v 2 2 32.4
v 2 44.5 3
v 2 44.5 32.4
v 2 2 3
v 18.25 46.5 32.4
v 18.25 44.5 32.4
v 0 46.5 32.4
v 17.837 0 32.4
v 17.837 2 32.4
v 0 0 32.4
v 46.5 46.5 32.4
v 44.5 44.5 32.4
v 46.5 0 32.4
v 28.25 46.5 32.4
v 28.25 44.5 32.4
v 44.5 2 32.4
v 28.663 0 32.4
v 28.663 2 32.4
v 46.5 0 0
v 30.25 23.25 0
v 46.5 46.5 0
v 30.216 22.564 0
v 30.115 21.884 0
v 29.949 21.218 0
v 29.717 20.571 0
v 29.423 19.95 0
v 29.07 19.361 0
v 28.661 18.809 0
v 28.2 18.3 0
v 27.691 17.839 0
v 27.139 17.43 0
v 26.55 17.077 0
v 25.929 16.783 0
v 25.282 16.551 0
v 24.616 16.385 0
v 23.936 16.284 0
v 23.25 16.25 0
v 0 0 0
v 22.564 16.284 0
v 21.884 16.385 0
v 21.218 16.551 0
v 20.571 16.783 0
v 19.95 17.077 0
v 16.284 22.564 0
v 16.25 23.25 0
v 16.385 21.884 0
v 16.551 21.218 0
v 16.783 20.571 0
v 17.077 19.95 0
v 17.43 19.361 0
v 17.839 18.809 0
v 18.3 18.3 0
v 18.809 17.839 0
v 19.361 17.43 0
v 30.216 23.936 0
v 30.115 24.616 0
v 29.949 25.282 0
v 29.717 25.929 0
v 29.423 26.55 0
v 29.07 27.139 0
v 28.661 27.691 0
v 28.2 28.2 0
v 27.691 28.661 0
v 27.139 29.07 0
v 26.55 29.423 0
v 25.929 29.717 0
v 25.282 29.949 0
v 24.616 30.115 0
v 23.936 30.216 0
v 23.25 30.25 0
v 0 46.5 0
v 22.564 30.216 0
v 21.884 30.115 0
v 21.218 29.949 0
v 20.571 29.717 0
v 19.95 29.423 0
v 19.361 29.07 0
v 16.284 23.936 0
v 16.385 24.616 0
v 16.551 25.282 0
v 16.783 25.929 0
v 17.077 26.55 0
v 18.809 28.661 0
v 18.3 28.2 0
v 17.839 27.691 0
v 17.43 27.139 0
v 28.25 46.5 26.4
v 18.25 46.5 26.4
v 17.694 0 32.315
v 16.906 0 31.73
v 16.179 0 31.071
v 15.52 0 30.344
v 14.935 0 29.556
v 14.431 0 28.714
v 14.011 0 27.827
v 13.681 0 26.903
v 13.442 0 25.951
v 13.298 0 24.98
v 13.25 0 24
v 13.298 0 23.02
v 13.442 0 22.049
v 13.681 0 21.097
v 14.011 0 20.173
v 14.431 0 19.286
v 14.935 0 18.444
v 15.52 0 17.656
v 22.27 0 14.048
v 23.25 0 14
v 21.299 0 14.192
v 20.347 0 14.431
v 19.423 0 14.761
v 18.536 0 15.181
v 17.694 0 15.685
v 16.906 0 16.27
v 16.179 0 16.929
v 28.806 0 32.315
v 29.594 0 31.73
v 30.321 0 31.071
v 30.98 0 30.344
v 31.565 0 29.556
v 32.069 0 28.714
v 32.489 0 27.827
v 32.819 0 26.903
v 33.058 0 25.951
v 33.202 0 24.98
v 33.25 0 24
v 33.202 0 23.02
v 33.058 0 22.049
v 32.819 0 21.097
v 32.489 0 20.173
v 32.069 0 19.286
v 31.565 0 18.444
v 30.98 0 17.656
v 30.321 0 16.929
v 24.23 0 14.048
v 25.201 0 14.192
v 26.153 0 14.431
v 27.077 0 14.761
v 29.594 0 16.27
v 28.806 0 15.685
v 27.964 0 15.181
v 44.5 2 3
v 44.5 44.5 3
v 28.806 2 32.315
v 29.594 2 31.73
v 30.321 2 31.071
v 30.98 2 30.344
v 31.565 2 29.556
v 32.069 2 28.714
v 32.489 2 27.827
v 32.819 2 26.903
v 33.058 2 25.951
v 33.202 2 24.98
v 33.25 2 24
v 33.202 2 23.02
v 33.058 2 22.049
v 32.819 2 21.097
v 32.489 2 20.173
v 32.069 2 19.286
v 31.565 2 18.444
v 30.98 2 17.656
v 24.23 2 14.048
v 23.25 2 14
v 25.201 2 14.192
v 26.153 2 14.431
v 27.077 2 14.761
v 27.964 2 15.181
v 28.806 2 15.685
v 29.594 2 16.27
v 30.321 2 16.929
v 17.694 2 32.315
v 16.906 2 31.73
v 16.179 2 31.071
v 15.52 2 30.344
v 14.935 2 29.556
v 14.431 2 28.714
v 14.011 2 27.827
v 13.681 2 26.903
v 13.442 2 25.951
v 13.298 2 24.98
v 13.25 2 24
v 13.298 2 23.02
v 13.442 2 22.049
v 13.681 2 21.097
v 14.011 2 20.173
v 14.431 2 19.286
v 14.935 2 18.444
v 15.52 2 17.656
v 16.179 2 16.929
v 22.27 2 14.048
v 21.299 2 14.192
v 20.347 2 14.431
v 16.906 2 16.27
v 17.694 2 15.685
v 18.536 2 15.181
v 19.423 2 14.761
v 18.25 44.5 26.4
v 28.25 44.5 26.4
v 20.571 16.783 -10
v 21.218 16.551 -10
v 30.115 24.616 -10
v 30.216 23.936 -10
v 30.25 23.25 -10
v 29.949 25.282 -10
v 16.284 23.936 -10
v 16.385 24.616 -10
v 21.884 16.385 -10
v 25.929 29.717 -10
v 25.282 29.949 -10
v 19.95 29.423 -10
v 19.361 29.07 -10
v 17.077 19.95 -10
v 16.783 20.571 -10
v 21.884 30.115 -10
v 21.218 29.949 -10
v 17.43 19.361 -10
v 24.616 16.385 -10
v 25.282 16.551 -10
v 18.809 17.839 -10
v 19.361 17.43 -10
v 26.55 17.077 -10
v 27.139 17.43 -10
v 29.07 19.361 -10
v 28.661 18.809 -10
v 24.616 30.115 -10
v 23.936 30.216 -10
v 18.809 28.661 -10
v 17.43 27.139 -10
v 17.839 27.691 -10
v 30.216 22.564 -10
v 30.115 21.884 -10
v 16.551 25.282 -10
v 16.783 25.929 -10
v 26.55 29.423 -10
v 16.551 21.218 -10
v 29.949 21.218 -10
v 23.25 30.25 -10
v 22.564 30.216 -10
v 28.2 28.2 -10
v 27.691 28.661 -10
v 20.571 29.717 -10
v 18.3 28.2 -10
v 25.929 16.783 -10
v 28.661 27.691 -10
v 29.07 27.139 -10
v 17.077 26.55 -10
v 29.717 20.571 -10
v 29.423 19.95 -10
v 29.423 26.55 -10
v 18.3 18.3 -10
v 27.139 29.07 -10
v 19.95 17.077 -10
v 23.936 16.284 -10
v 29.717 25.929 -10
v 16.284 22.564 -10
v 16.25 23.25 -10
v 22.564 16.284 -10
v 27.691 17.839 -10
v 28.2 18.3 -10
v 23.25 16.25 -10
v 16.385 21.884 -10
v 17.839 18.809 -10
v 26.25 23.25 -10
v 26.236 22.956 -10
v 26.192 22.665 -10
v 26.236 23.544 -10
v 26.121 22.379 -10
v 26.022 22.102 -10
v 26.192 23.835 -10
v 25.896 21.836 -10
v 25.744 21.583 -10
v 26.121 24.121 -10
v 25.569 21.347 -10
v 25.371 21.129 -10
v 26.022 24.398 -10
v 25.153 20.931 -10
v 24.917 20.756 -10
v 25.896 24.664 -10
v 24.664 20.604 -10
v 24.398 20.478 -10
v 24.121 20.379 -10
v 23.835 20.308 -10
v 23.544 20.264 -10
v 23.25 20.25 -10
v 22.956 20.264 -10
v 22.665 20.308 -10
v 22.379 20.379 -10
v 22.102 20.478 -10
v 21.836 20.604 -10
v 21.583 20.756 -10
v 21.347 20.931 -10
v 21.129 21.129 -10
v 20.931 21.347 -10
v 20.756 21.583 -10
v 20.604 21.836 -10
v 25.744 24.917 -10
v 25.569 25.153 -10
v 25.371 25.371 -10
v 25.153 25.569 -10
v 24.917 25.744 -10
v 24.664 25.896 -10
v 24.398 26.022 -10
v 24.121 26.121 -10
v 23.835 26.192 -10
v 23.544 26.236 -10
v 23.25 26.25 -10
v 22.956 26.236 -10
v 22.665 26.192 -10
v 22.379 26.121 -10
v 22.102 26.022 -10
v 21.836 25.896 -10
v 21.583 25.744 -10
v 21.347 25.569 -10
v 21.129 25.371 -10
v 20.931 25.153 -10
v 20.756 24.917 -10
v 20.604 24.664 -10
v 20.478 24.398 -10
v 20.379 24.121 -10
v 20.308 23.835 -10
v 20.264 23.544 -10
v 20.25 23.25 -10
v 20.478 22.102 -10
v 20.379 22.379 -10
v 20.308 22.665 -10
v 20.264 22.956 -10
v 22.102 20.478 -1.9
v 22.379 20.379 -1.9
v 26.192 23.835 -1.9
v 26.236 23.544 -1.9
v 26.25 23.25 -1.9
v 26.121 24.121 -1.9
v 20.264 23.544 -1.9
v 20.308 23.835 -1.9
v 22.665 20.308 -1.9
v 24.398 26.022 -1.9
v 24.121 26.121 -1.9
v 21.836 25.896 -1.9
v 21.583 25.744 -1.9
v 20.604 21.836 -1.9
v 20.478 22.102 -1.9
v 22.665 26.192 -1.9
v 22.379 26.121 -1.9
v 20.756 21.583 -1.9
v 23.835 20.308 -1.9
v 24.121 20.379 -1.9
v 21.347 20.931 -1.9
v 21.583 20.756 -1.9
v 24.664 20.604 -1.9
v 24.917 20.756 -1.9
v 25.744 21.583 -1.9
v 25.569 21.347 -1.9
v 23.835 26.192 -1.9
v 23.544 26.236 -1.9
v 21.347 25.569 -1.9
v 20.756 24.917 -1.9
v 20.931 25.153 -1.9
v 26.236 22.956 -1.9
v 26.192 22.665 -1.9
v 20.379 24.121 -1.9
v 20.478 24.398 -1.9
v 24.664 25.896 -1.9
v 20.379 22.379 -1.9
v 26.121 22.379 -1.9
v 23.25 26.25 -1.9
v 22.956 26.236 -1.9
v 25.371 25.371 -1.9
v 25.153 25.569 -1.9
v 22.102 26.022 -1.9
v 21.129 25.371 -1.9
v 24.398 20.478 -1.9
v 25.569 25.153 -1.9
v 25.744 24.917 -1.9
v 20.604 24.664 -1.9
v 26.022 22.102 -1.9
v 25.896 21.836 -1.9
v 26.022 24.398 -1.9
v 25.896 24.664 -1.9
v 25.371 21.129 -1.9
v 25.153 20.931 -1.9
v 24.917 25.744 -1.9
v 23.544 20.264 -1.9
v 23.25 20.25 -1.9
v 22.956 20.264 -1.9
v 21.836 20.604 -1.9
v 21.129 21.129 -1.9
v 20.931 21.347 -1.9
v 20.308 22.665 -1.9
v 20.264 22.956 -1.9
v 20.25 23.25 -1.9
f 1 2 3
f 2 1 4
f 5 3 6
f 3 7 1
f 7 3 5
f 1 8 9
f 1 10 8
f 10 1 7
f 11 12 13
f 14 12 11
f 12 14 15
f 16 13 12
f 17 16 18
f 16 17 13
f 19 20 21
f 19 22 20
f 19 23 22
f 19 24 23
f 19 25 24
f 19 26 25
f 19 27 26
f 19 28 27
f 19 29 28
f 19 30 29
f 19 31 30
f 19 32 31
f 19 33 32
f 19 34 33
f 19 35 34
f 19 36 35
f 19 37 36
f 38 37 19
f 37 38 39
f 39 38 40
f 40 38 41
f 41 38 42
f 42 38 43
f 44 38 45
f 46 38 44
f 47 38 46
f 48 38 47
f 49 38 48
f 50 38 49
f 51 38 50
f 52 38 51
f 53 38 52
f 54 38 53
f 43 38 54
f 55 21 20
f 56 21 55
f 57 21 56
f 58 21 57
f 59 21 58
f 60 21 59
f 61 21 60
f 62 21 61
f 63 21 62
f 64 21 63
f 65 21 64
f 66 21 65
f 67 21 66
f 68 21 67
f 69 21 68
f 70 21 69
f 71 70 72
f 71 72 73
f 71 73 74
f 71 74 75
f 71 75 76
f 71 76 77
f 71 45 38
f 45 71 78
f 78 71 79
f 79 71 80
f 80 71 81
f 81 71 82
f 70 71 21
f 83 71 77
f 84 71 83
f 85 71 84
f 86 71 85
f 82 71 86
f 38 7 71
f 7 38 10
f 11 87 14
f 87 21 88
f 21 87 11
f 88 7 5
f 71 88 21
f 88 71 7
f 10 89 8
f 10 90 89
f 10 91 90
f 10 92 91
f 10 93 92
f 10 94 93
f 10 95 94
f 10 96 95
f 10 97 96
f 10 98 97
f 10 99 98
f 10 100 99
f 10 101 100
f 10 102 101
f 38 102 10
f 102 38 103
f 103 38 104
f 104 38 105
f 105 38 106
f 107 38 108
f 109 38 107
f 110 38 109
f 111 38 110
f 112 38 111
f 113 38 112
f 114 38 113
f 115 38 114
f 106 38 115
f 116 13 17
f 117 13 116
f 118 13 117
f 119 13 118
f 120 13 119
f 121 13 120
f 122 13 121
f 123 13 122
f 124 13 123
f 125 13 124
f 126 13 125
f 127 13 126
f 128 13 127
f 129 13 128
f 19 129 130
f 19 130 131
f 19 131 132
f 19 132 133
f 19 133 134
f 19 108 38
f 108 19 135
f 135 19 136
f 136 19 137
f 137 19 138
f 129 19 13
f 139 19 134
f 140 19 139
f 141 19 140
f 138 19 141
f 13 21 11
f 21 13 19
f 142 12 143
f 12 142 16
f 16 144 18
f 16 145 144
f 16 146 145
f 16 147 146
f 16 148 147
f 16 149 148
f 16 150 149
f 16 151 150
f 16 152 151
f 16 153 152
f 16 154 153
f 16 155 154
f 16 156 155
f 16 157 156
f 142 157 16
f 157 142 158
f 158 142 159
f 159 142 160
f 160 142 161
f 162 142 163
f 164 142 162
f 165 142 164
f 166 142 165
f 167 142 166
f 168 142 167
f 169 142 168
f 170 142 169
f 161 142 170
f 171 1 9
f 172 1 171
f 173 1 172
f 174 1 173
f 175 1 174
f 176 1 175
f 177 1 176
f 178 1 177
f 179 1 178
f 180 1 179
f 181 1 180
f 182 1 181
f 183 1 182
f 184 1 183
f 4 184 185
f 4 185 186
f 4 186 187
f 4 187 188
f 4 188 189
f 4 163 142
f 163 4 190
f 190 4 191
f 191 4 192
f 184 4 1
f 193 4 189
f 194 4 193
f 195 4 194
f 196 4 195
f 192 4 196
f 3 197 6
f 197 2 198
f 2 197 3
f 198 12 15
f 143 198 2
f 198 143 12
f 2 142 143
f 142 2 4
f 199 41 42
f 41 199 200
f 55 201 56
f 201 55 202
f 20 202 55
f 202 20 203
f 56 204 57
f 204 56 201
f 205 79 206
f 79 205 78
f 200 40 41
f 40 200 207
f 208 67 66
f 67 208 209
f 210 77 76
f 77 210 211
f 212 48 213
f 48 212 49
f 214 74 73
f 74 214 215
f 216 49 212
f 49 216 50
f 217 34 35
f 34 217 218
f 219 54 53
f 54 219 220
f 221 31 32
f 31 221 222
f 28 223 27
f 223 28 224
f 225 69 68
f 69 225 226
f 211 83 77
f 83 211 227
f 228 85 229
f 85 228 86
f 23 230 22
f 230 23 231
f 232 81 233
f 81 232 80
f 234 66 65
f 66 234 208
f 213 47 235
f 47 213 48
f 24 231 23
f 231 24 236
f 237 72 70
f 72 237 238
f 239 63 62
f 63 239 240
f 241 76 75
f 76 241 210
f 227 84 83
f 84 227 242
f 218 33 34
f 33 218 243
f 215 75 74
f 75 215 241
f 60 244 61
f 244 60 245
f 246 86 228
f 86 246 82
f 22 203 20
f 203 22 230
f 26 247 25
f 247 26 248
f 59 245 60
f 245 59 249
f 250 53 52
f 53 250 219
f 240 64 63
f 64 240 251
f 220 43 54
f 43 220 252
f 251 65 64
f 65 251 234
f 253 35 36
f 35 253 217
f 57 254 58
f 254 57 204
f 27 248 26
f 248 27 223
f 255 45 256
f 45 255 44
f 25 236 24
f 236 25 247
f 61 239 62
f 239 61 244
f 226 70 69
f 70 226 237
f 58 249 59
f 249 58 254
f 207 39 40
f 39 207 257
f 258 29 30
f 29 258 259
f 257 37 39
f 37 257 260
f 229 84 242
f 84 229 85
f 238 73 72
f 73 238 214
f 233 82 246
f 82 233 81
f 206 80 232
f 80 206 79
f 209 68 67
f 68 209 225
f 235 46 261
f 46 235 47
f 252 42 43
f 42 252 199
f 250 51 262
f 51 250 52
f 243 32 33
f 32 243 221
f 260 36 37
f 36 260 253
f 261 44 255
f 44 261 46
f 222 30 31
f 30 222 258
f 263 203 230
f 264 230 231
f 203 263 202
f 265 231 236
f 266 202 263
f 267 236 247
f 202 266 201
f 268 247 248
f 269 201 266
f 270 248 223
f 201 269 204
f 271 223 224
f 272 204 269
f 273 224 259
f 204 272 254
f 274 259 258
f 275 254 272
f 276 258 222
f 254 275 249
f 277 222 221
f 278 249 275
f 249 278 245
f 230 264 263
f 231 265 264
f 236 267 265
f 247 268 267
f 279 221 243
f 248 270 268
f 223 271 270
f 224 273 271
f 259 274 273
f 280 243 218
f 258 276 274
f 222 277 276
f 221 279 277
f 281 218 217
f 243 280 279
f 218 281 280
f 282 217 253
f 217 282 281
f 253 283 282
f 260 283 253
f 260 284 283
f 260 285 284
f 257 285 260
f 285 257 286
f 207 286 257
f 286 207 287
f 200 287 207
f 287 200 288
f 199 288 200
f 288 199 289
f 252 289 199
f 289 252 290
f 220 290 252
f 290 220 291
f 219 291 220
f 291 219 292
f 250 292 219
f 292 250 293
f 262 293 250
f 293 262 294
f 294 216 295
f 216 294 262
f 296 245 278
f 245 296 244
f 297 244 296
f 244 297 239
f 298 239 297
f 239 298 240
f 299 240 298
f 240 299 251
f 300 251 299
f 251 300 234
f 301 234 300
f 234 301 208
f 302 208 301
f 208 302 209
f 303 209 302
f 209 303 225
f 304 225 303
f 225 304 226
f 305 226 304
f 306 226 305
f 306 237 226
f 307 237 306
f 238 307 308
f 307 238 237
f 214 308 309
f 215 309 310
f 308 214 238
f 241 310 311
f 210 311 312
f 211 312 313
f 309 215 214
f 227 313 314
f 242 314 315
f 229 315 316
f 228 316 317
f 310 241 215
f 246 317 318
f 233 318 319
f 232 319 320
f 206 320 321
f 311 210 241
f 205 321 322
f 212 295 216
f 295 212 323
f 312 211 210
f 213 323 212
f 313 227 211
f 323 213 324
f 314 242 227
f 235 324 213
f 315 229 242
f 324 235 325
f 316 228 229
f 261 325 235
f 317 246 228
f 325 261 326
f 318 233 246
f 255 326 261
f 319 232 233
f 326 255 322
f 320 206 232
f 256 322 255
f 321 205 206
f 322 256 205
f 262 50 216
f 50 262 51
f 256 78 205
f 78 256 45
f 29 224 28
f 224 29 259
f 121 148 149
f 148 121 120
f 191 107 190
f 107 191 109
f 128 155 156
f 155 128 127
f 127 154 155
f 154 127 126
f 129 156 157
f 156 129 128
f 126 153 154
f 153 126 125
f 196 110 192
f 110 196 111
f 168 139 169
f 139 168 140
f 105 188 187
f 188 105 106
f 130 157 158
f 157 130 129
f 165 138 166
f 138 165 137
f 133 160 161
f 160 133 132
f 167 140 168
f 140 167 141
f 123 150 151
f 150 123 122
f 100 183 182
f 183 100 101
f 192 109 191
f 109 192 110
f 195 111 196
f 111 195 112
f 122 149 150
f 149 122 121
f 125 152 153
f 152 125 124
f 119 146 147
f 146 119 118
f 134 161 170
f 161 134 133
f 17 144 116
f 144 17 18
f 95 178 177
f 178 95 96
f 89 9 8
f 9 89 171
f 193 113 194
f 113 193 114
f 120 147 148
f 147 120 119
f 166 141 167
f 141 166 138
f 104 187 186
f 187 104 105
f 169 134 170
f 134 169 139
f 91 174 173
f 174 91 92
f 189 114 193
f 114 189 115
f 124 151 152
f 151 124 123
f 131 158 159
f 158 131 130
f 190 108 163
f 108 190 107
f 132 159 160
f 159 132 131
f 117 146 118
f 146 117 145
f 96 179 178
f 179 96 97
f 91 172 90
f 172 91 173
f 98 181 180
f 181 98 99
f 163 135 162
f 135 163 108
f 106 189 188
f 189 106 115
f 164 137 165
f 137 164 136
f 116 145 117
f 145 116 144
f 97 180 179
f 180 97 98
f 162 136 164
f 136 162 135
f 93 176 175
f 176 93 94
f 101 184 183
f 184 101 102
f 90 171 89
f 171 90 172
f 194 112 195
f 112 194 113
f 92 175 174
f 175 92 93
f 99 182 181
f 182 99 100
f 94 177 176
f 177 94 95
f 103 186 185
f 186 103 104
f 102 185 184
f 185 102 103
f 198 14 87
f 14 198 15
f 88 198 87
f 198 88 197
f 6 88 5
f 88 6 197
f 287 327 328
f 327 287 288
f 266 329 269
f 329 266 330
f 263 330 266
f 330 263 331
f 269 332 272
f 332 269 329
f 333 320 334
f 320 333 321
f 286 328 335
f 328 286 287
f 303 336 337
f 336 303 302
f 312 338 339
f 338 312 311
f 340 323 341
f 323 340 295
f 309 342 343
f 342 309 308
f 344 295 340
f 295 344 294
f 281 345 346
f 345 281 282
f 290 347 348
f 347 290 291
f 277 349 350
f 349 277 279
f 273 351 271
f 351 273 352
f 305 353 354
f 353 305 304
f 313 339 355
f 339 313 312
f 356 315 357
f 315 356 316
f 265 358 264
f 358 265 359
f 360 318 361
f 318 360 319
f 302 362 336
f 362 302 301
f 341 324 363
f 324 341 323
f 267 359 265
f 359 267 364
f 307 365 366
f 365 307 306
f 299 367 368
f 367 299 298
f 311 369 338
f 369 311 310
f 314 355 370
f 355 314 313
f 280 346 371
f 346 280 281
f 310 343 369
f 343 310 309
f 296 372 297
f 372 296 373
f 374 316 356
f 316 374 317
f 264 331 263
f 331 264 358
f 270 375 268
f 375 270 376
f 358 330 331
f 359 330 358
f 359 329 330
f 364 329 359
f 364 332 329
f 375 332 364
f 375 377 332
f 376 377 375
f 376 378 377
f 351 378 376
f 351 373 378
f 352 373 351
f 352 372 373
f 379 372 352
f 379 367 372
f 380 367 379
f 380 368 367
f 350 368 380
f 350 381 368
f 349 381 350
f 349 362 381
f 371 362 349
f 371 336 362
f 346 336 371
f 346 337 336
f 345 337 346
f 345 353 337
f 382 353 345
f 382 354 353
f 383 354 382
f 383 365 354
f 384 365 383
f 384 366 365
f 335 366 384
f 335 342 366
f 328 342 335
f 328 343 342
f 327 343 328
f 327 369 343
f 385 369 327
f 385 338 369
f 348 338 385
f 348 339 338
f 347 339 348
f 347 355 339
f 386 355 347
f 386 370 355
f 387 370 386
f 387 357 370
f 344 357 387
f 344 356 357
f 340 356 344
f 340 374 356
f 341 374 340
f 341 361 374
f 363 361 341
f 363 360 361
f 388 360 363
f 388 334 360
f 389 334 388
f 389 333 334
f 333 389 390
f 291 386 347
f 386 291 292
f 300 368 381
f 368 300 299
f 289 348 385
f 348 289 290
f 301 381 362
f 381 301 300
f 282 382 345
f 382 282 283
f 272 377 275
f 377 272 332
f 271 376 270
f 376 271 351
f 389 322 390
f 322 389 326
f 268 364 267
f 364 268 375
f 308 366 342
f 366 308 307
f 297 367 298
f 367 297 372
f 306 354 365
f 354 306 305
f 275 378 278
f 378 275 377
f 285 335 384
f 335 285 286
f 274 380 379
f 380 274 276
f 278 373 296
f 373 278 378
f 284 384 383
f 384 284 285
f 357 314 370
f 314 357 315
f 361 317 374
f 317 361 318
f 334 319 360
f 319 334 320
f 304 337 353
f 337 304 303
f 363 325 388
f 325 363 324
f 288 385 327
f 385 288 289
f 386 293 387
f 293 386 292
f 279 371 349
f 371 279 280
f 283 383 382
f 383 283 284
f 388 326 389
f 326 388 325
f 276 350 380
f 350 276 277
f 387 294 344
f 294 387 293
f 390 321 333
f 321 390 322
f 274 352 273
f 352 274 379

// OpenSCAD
// Shitbox Rally — ELP 4K front camera dash cradle
//
// U-shaped cradle holding the ELP 4K camera module (42mm cube in metal case).
// Camera drops in from the top, lens faces forward. 1/4"-20 UNC heat-set
// insert boss on the bottom for tripod mount already on dash.
//
// Print upside-down (cradle opening on bed) so tripod boss prints without support.
//
// Measured with calipers 2026-04-18 ±0.5mm:
//   Camera body: 42 × 42 × 42mm (metal case, cube)
//   No PCB mounting holes — friction fit in cradle
//   USB cable exits from rear face (top edge)
//   Lens protrudes from front face (centre)
//
// Units: mm.

$fn = 64;

// ---- Camera body (measured 2026-04-18) ----
CAM_W = 42;               // width (left-right)
CAM_D = 42;               // depth (front-back)
CAM_H = 42;               // height

// ---- Cradle construction ----
CRADLE_WALL  = 2.0;        // wall thickness (matches OUTER_WALL convention)
CRADLE_TOL   = 0.5;        // clearance around camera body
CRADLE_FLOOR = 3.0;        // base thickness above tripod boss

// ---- Tripod mount (1/4"-20 UNC heat-set insert) ----
TRIPOD_HOLE_D  = 6.0;      // hole for heat-set insert (slightly under insert OD)
TRIPOD_BOSS_D  = 14.0;     // boss around insert for strength
TRIPOD_DEPTH   = 8.0;      // insert depth into boss
TRIPOD_BOSS_H  = 10.0;     // total boss height below base (insert depth + 2mm solid base)

// ---- Lens aperture ----
LENS_D         = 20;        // generous aperture for lens + adjustment ring
LENS_CZ        = CAM_H / 2; // lens centre height on camera face

// ---- USB cable exit ----
USB_EXIT_W     = 10;        // width of cable exit slot
USB_EXIT_H     = 6;         // height of cable exit slot

// ---- Derived dimensions ----
INNER_W = CAM_W + CRADLE_TOL;
INNER_D = CAM_D + CRADLE_TOL;
OUTER_W = INNER_W + 2 * CRADLE_WALL;
OUTER_D = INNER_D + 2 * CRADLE_WALL;
WALL_H  = CAM_H * 0.7;     // walls 70% of camera height (open top, camera held by friction)


// =====================================================
//   Main
// =====================================================
camera_bracket();


// =====================================================
module camera_bracket() {
    difference() {
        union() {
            cradle_base();
            cradle_walls();
            cradle_tripod_boss();
        }
        cradle_cavity();
        cradle_lens_aperture();
        cradle_usb_exit();
        cradle_tripod_hole();
    }
}


// =====================================================
//   Solid components
// =====================================================
module cradle_base() {
    cube([OUTER_W, OUTER_D, CRADLE_FLOOR]);
}

module cradle_walls() {
    // Left wall
    cube([CRADLE_WALL, OUTER_D, CRADLE_FLOOR + WALL_H]);

    // Right wall
    translate([CRADLE_WALL + INNER_W, 0, 0])
        cube([CRADLE_WALL, OUTER_D, CRADLE_FLOOR + WALL_H]);

    // Front wall (lens side)
    cube([OUTER_W, CRADLE_WALL, CRADLE_FLOOR + WALL_H]);

    // Rear wall (USB cable side — shorter for cable exit)
    translate([0, CRADLE_WALL + INNER_D, 0])
        cube([OUTER_W, CRADLE_WALL, CRADLE_FLOOR + WALL_H]);
}

module cradle_tripod_boss() {
    // Reinforced boss extending below base for 1/4"-20 heat-set insert
    translate([OUTER_W / 2, OUTER_D / 2, -TRIPOD_BOSS_H])
        cylinder(d = TRIPOD_BOSS_D, h = TRIPOD_BOSS_H + CRADLE_FLOOR);
}


// =====================================================
//   Cutouts
// =====================================================
module cradle_cavity() {
    // Interior pocket for camera body
    translate([CRADLE_WALL, CRADLE_WALL, CRADLE_FLOOR])
        cube([INNER_W, INNER_D, WALL_H + 1]);
}

module cradle_lens_aperture() {
    // Circular cutout in front wall for lens
    translate([OUTER_W / 2, -0.1, CRADLE_FLOOR + LENS_CZ])
        rotate([270, 0, 0])
            cylinder(d = LENS_D, h = CRADLE_WALL + 0.2);
}

module cradle_usb_exit() {
    // Slot in rear wall for USB cable
    translate([OUTER_W / 2 - USB_EXIT_W / 2,
               CRADLE_WALL + INNER_D - 0.1,
               CRADLE_FLOOR + WALL_H - USB_EXIT_H])
        cube([USB_EXIT_W, CRADLE_WALL + 0.2, USB_EXIT_H + 1]);
}

module cradle_tripod_hole() {
    // Hole for 1/4"-20 heat-set insert from bottom of boss
    translate([OUTER_W / 2, OUTER_D / 2, -TRIPOD_BOSS_H - 0.1])
        cylinder(d = TRIPOD_HOLE_D, h = TRIPOD_DEPTH + 0.2);
}
